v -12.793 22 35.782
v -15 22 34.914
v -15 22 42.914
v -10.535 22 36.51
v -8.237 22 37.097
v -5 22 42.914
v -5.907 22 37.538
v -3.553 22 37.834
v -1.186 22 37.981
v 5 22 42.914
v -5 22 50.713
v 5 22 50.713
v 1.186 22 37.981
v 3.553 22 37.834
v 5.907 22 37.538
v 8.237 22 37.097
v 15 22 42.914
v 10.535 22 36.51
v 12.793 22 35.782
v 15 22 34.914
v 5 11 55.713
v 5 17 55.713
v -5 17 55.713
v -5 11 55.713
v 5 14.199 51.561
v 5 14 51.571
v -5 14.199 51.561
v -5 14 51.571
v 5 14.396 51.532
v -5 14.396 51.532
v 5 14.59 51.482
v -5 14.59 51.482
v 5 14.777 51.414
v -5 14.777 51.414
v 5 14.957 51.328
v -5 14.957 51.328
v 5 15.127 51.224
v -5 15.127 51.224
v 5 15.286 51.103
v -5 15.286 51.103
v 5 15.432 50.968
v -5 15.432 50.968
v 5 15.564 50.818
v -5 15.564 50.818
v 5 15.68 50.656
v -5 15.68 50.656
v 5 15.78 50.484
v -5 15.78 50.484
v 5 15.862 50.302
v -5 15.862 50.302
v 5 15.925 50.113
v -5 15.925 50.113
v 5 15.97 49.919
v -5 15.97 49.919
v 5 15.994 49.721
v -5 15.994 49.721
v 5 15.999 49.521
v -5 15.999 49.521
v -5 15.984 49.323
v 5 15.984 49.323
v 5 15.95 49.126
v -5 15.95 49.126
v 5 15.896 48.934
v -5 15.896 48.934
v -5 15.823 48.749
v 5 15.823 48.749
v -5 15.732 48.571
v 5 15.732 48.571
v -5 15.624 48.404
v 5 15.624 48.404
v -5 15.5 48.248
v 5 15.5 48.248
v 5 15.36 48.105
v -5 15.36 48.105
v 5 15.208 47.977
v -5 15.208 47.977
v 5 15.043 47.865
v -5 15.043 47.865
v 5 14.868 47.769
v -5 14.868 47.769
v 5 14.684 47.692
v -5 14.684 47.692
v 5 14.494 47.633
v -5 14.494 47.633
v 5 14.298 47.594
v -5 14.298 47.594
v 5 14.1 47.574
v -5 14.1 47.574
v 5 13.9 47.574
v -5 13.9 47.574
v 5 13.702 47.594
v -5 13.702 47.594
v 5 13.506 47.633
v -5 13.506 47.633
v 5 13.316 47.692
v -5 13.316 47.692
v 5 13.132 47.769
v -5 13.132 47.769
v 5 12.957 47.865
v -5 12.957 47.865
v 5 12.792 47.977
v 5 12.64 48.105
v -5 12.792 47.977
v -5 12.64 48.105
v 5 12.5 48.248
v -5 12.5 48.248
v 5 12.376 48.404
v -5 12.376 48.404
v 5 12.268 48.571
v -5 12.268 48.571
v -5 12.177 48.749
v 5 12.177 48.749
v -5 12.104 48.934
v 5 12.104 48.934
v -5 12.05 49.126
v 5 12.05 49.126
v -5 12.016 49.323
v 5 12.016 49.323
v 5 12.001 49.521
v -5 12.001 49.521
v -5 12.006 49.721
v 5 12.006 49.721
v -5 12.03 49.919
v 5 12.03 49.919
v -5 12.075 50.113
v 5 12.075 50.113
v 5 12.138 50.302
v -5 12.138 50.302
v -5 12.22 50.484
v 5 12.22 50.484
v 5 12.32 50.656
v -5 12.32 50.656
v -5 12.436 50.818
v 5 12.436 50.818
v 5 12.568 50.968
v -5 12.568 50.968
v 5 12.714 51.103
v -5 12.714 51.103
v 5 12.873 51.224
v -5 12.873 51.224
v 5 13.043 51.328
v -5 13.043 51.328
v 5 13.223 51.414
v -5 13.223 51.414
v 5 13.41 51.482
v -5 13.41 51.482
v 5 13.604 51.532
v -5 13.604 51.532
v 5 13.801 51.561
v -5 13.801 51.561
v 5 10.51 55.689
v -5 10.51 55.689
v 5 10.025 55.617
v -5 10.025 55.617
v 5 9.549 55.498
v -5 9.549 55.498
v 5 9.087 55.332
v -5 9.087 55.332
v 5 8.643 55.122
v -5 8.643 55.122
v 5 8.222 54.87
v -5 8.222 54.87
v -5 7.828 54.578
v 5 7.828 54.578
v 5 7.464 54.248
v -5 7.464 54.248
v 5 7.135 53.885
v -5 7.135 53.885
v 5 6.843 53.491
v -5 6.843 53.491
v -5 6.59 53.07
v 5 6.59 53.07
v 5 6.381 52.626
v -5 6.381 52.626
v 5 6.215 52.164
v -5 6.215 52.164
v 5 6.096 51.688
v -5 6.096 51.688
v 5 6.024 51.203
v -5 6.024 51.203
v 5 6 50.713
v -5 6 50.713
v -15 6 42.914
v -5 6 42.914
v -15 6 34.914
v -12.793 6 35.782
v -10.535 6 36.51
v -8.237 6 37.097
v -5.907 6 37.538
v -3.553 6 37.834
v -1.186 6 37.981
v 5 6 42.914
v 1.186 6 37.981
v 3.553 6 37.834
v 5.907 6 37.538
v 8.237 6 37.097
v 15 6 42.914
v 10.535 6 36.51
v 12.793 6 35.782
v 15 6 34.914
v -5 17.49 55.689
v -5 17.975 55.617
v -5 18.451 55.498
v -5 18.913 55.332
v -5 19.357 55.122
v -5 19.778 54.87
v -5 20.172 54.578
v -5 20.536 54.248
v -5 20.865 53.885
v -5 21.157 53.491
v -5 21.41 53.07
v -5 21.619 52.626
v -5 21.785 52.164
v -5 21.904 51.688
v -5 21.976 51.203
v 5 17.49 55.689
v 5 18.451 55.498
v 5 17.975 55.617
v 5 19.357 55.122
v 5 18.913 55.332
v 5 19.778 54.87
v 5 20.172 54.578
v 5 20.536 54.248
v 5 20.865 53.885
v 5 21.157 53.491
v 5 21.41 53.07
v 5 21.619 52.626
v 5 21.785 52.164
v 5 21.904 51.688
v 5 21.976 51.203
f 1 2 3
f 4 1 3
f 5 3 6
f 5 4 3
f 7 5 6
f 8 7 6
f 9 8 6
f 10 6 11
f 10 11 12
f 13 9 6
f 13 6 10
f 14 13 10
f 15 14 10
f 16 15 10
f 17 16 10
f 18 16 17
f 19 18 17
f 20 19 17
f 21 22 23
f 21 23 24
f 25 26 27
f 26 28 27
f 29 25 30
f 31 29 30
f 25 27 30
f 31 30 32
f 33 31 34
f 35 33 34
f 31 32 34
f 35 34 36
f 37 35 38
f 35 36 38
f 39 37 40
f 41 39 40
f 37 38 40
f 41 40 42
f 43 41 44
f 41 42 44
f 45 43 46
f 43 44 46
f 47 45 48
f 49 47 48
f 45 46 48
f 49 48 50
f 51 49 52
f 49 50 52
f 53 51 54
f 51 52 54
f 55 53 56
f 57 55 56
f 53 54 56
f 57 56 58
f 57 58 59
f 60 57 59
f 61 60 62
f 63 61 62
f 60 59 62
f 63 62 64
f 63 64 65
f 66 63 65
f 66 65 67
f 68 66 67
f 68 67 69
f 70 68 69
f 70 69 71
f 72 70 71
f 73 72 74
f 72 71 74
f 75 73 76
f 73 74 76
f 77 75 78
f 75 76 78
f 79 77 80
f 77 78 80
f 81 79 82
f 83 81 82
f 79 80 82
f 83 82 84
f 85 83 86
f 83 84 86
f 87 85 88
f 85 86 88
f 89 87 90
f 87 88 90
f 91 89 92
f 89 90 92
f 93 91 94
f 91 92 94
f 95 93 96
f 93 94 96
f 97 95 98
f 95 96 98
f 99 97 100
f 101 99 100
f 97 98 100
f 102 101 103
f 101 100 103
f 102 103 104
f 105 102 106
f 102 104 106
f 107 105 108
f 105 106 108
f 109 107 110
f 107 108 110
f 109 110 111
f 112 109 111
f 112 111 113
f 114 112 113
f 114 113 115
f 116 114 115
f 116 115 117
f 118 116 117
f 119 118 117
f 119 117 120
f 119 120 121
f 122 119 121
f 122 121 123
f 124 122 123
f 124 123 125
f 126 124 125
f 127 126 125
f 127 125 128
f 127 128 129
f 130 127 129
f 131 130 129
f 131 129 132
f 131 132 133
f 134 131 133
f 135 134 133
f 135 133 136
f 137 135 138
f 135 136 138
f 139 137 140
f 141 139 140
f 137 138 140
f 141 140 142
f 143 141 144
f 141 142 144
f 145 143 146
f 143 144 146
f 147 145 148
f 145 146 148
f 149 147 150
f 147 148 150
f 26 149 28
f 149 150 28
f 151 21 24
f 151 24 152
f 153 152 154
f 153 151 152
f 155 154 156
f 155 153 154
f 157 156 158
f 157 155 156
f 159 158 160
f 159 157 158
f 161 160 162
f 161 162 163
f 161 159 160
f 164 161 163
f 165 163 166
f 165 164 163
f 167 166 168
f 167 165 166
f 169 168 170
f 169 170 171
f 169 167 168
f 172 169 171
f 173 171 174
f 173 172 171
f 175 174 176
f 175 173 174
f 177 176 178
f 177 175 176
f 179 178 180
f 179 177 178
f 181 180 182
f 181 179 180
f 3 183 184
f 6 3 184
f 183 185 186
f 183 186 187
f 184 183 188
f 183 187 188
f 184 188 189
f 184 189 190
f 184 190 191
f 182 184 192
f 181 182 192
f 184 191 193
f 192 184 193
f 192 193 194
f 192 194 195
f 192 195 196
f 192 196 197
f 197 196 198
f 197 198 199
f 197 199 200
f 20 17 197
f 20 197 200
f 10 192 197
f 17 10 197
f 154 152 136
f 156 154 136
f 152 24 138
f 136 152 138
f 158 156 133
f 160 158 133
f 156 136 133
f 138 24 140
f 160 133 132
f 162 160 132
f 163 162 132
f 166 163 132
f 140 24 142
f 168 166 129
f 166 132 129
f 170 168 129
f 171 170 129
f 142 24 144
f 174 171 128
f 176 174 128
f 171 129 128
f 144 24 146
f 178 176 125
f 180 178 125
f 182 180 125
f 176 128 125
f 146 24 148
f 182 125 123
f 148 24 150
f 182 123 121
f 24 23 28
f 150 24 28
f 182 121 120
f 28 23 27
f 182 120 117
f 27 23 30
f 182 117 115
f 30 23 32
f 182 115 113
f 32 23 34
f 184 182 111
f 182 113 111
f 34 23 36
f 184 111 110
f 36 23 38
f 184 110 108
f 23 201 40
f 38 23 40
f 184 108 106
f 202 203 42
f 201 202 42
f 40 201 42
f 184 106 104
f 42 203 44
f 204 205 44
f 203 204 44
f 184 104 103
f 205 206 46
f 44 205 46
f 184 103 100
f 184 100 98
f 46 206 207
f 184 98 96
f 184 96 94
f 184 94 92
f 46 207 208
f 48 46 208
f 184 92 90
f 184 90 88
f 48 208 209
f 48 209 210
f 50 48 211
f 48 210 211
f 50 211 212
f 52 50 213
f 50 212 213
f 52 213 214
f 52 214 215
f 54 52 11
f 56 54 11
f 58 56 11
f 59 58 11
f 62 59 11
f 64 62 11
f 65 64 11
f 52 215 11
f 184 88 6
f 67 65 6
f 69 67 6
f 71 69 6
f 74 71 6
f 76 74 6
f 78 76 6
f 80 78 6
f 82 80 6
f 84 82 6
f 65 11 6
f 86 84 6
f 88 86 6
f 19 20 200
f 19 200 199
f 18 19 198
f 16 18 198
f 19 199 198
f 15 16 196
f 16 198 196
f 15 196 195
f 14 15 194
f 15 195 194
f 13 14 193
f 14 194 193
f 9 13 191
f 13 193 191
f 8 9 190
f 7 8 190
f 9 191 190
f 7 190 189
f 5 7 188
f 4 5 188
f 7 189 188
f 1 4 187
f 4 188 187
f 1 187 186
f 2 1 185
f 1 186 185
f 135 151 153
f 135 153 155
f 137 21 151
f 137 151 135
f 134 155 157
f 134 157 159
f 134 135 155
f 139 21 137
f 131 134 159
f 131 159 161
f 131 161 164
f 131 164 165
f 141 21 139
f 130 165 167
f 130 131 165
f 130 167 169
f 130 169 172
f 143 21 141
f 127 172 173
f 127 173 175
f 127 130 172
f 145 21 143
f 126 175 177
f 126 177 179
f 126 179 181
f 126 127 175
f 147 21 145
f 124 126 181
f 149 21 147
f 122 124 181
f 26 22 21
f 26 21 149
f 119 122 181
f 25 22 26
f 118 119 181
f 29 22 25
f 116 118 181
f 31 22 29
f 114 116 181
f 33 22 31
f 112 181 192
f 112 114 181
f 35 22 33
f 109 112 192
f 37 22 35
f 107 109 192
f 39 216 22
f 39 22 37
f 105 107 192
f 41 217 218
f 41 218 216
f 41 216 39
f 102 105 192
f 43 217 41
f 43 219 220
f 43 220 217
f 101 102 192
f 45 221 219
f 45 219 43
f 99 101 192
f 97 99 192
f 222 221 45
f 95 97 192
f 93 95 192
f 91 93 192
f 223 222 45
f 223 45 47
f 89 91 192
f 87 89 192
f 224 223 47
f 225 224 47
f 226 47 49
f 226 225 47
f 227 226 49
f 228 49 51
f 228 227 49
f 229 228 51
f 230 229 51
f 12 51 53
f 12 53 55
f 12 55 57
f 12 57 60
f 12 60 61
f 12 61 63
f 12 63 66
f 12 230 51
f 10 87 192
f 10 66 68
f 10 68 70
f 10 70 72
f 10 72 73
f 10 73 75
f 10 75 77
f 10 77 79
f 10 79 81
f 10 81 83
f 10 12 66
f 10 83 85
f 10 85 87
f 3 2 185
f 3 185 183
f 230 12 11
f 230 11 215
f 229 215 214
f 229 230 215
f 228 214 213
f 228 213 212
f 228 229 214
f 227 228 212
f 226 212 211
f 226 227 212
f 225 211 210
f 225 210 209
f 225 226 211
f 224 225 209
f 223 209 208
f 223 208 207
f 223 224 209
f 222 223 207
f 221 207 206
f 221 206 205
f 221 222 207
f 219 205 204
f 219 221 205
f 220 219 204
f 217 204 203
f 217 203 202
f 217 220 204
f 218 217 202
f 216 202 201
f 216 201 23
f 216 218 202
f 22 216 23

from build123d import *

# Parameters (mm, degrees)
EXTRUDE_START       = 6
EXTRUDE_1_DEPTH     = 16
EXTRUDE_2_DEPTH     = 5
SKETCH_3_R          = 2
CUT_EXTRUDE_1_DEPTH = 15


with BuildPart() as part:
    # Эскиз1 → Вытянуть1 (new body)
    with BuildSketch(Plane(origin=(0, 0, 0), x_dir=(1, 0, 0), z_dir=(0, 1, 0)).offset(EXTRUDE_START)):
        with BuildLine():
            Line((-15, -34.9141805), (-15, -42.9141805))
            Line((-15, -42.9141805), (15, -42.9141805))
            Line((15, -42.9141805), (15, -34.9141805))
            ThreePointArc((15, -34.9141805), (0, -38), (-15, -34.9141805))
        make_face()
    extrude(amount=EXTRUDE_1_DEPTH)

    # Эскиз2 → Вытянуть2 (add, symmetric)
    with BuildSketch(Plane(origin=(0, 0, 0), x_dir=(0, 0, -1), z_dir=(1, 0, 0))):
        with BuildLine():
            Line((-42.9141805, 22), (-50.712858665, 22))
            ThreePointArc((-50.712858665, 22), (-54.248392571, 20.535533906), (-55.712858665, 17))
            Line((-55.712858665, 17), (-55.712858665, 11))
            ThreePointArc((-55.712858665, 11), (-54.248392571, 7.464466094), (-50.712858665, 6))
            Line((-50.712858665, 6), (-42.9141805, 6))
            Line((-42.9141805, 6), (-42.9141805, 22))
        make_face()
    extrude(amount=EXTRUDE_2_DEPTH, both=True)

    # Эскиз3 → Вырез-Вытянуть1 (cut, symmetric)
    with BuildSketch(Plane.ZY.offset(5)):
        with Locations((49.571306652, 14)):
            Circle(SKETCH_3_R)
    extrude(amount=CUT_EXTRUDE_1_DEPTH, both=True, mode=Mode.SUBTRACT)


solid = part.part
